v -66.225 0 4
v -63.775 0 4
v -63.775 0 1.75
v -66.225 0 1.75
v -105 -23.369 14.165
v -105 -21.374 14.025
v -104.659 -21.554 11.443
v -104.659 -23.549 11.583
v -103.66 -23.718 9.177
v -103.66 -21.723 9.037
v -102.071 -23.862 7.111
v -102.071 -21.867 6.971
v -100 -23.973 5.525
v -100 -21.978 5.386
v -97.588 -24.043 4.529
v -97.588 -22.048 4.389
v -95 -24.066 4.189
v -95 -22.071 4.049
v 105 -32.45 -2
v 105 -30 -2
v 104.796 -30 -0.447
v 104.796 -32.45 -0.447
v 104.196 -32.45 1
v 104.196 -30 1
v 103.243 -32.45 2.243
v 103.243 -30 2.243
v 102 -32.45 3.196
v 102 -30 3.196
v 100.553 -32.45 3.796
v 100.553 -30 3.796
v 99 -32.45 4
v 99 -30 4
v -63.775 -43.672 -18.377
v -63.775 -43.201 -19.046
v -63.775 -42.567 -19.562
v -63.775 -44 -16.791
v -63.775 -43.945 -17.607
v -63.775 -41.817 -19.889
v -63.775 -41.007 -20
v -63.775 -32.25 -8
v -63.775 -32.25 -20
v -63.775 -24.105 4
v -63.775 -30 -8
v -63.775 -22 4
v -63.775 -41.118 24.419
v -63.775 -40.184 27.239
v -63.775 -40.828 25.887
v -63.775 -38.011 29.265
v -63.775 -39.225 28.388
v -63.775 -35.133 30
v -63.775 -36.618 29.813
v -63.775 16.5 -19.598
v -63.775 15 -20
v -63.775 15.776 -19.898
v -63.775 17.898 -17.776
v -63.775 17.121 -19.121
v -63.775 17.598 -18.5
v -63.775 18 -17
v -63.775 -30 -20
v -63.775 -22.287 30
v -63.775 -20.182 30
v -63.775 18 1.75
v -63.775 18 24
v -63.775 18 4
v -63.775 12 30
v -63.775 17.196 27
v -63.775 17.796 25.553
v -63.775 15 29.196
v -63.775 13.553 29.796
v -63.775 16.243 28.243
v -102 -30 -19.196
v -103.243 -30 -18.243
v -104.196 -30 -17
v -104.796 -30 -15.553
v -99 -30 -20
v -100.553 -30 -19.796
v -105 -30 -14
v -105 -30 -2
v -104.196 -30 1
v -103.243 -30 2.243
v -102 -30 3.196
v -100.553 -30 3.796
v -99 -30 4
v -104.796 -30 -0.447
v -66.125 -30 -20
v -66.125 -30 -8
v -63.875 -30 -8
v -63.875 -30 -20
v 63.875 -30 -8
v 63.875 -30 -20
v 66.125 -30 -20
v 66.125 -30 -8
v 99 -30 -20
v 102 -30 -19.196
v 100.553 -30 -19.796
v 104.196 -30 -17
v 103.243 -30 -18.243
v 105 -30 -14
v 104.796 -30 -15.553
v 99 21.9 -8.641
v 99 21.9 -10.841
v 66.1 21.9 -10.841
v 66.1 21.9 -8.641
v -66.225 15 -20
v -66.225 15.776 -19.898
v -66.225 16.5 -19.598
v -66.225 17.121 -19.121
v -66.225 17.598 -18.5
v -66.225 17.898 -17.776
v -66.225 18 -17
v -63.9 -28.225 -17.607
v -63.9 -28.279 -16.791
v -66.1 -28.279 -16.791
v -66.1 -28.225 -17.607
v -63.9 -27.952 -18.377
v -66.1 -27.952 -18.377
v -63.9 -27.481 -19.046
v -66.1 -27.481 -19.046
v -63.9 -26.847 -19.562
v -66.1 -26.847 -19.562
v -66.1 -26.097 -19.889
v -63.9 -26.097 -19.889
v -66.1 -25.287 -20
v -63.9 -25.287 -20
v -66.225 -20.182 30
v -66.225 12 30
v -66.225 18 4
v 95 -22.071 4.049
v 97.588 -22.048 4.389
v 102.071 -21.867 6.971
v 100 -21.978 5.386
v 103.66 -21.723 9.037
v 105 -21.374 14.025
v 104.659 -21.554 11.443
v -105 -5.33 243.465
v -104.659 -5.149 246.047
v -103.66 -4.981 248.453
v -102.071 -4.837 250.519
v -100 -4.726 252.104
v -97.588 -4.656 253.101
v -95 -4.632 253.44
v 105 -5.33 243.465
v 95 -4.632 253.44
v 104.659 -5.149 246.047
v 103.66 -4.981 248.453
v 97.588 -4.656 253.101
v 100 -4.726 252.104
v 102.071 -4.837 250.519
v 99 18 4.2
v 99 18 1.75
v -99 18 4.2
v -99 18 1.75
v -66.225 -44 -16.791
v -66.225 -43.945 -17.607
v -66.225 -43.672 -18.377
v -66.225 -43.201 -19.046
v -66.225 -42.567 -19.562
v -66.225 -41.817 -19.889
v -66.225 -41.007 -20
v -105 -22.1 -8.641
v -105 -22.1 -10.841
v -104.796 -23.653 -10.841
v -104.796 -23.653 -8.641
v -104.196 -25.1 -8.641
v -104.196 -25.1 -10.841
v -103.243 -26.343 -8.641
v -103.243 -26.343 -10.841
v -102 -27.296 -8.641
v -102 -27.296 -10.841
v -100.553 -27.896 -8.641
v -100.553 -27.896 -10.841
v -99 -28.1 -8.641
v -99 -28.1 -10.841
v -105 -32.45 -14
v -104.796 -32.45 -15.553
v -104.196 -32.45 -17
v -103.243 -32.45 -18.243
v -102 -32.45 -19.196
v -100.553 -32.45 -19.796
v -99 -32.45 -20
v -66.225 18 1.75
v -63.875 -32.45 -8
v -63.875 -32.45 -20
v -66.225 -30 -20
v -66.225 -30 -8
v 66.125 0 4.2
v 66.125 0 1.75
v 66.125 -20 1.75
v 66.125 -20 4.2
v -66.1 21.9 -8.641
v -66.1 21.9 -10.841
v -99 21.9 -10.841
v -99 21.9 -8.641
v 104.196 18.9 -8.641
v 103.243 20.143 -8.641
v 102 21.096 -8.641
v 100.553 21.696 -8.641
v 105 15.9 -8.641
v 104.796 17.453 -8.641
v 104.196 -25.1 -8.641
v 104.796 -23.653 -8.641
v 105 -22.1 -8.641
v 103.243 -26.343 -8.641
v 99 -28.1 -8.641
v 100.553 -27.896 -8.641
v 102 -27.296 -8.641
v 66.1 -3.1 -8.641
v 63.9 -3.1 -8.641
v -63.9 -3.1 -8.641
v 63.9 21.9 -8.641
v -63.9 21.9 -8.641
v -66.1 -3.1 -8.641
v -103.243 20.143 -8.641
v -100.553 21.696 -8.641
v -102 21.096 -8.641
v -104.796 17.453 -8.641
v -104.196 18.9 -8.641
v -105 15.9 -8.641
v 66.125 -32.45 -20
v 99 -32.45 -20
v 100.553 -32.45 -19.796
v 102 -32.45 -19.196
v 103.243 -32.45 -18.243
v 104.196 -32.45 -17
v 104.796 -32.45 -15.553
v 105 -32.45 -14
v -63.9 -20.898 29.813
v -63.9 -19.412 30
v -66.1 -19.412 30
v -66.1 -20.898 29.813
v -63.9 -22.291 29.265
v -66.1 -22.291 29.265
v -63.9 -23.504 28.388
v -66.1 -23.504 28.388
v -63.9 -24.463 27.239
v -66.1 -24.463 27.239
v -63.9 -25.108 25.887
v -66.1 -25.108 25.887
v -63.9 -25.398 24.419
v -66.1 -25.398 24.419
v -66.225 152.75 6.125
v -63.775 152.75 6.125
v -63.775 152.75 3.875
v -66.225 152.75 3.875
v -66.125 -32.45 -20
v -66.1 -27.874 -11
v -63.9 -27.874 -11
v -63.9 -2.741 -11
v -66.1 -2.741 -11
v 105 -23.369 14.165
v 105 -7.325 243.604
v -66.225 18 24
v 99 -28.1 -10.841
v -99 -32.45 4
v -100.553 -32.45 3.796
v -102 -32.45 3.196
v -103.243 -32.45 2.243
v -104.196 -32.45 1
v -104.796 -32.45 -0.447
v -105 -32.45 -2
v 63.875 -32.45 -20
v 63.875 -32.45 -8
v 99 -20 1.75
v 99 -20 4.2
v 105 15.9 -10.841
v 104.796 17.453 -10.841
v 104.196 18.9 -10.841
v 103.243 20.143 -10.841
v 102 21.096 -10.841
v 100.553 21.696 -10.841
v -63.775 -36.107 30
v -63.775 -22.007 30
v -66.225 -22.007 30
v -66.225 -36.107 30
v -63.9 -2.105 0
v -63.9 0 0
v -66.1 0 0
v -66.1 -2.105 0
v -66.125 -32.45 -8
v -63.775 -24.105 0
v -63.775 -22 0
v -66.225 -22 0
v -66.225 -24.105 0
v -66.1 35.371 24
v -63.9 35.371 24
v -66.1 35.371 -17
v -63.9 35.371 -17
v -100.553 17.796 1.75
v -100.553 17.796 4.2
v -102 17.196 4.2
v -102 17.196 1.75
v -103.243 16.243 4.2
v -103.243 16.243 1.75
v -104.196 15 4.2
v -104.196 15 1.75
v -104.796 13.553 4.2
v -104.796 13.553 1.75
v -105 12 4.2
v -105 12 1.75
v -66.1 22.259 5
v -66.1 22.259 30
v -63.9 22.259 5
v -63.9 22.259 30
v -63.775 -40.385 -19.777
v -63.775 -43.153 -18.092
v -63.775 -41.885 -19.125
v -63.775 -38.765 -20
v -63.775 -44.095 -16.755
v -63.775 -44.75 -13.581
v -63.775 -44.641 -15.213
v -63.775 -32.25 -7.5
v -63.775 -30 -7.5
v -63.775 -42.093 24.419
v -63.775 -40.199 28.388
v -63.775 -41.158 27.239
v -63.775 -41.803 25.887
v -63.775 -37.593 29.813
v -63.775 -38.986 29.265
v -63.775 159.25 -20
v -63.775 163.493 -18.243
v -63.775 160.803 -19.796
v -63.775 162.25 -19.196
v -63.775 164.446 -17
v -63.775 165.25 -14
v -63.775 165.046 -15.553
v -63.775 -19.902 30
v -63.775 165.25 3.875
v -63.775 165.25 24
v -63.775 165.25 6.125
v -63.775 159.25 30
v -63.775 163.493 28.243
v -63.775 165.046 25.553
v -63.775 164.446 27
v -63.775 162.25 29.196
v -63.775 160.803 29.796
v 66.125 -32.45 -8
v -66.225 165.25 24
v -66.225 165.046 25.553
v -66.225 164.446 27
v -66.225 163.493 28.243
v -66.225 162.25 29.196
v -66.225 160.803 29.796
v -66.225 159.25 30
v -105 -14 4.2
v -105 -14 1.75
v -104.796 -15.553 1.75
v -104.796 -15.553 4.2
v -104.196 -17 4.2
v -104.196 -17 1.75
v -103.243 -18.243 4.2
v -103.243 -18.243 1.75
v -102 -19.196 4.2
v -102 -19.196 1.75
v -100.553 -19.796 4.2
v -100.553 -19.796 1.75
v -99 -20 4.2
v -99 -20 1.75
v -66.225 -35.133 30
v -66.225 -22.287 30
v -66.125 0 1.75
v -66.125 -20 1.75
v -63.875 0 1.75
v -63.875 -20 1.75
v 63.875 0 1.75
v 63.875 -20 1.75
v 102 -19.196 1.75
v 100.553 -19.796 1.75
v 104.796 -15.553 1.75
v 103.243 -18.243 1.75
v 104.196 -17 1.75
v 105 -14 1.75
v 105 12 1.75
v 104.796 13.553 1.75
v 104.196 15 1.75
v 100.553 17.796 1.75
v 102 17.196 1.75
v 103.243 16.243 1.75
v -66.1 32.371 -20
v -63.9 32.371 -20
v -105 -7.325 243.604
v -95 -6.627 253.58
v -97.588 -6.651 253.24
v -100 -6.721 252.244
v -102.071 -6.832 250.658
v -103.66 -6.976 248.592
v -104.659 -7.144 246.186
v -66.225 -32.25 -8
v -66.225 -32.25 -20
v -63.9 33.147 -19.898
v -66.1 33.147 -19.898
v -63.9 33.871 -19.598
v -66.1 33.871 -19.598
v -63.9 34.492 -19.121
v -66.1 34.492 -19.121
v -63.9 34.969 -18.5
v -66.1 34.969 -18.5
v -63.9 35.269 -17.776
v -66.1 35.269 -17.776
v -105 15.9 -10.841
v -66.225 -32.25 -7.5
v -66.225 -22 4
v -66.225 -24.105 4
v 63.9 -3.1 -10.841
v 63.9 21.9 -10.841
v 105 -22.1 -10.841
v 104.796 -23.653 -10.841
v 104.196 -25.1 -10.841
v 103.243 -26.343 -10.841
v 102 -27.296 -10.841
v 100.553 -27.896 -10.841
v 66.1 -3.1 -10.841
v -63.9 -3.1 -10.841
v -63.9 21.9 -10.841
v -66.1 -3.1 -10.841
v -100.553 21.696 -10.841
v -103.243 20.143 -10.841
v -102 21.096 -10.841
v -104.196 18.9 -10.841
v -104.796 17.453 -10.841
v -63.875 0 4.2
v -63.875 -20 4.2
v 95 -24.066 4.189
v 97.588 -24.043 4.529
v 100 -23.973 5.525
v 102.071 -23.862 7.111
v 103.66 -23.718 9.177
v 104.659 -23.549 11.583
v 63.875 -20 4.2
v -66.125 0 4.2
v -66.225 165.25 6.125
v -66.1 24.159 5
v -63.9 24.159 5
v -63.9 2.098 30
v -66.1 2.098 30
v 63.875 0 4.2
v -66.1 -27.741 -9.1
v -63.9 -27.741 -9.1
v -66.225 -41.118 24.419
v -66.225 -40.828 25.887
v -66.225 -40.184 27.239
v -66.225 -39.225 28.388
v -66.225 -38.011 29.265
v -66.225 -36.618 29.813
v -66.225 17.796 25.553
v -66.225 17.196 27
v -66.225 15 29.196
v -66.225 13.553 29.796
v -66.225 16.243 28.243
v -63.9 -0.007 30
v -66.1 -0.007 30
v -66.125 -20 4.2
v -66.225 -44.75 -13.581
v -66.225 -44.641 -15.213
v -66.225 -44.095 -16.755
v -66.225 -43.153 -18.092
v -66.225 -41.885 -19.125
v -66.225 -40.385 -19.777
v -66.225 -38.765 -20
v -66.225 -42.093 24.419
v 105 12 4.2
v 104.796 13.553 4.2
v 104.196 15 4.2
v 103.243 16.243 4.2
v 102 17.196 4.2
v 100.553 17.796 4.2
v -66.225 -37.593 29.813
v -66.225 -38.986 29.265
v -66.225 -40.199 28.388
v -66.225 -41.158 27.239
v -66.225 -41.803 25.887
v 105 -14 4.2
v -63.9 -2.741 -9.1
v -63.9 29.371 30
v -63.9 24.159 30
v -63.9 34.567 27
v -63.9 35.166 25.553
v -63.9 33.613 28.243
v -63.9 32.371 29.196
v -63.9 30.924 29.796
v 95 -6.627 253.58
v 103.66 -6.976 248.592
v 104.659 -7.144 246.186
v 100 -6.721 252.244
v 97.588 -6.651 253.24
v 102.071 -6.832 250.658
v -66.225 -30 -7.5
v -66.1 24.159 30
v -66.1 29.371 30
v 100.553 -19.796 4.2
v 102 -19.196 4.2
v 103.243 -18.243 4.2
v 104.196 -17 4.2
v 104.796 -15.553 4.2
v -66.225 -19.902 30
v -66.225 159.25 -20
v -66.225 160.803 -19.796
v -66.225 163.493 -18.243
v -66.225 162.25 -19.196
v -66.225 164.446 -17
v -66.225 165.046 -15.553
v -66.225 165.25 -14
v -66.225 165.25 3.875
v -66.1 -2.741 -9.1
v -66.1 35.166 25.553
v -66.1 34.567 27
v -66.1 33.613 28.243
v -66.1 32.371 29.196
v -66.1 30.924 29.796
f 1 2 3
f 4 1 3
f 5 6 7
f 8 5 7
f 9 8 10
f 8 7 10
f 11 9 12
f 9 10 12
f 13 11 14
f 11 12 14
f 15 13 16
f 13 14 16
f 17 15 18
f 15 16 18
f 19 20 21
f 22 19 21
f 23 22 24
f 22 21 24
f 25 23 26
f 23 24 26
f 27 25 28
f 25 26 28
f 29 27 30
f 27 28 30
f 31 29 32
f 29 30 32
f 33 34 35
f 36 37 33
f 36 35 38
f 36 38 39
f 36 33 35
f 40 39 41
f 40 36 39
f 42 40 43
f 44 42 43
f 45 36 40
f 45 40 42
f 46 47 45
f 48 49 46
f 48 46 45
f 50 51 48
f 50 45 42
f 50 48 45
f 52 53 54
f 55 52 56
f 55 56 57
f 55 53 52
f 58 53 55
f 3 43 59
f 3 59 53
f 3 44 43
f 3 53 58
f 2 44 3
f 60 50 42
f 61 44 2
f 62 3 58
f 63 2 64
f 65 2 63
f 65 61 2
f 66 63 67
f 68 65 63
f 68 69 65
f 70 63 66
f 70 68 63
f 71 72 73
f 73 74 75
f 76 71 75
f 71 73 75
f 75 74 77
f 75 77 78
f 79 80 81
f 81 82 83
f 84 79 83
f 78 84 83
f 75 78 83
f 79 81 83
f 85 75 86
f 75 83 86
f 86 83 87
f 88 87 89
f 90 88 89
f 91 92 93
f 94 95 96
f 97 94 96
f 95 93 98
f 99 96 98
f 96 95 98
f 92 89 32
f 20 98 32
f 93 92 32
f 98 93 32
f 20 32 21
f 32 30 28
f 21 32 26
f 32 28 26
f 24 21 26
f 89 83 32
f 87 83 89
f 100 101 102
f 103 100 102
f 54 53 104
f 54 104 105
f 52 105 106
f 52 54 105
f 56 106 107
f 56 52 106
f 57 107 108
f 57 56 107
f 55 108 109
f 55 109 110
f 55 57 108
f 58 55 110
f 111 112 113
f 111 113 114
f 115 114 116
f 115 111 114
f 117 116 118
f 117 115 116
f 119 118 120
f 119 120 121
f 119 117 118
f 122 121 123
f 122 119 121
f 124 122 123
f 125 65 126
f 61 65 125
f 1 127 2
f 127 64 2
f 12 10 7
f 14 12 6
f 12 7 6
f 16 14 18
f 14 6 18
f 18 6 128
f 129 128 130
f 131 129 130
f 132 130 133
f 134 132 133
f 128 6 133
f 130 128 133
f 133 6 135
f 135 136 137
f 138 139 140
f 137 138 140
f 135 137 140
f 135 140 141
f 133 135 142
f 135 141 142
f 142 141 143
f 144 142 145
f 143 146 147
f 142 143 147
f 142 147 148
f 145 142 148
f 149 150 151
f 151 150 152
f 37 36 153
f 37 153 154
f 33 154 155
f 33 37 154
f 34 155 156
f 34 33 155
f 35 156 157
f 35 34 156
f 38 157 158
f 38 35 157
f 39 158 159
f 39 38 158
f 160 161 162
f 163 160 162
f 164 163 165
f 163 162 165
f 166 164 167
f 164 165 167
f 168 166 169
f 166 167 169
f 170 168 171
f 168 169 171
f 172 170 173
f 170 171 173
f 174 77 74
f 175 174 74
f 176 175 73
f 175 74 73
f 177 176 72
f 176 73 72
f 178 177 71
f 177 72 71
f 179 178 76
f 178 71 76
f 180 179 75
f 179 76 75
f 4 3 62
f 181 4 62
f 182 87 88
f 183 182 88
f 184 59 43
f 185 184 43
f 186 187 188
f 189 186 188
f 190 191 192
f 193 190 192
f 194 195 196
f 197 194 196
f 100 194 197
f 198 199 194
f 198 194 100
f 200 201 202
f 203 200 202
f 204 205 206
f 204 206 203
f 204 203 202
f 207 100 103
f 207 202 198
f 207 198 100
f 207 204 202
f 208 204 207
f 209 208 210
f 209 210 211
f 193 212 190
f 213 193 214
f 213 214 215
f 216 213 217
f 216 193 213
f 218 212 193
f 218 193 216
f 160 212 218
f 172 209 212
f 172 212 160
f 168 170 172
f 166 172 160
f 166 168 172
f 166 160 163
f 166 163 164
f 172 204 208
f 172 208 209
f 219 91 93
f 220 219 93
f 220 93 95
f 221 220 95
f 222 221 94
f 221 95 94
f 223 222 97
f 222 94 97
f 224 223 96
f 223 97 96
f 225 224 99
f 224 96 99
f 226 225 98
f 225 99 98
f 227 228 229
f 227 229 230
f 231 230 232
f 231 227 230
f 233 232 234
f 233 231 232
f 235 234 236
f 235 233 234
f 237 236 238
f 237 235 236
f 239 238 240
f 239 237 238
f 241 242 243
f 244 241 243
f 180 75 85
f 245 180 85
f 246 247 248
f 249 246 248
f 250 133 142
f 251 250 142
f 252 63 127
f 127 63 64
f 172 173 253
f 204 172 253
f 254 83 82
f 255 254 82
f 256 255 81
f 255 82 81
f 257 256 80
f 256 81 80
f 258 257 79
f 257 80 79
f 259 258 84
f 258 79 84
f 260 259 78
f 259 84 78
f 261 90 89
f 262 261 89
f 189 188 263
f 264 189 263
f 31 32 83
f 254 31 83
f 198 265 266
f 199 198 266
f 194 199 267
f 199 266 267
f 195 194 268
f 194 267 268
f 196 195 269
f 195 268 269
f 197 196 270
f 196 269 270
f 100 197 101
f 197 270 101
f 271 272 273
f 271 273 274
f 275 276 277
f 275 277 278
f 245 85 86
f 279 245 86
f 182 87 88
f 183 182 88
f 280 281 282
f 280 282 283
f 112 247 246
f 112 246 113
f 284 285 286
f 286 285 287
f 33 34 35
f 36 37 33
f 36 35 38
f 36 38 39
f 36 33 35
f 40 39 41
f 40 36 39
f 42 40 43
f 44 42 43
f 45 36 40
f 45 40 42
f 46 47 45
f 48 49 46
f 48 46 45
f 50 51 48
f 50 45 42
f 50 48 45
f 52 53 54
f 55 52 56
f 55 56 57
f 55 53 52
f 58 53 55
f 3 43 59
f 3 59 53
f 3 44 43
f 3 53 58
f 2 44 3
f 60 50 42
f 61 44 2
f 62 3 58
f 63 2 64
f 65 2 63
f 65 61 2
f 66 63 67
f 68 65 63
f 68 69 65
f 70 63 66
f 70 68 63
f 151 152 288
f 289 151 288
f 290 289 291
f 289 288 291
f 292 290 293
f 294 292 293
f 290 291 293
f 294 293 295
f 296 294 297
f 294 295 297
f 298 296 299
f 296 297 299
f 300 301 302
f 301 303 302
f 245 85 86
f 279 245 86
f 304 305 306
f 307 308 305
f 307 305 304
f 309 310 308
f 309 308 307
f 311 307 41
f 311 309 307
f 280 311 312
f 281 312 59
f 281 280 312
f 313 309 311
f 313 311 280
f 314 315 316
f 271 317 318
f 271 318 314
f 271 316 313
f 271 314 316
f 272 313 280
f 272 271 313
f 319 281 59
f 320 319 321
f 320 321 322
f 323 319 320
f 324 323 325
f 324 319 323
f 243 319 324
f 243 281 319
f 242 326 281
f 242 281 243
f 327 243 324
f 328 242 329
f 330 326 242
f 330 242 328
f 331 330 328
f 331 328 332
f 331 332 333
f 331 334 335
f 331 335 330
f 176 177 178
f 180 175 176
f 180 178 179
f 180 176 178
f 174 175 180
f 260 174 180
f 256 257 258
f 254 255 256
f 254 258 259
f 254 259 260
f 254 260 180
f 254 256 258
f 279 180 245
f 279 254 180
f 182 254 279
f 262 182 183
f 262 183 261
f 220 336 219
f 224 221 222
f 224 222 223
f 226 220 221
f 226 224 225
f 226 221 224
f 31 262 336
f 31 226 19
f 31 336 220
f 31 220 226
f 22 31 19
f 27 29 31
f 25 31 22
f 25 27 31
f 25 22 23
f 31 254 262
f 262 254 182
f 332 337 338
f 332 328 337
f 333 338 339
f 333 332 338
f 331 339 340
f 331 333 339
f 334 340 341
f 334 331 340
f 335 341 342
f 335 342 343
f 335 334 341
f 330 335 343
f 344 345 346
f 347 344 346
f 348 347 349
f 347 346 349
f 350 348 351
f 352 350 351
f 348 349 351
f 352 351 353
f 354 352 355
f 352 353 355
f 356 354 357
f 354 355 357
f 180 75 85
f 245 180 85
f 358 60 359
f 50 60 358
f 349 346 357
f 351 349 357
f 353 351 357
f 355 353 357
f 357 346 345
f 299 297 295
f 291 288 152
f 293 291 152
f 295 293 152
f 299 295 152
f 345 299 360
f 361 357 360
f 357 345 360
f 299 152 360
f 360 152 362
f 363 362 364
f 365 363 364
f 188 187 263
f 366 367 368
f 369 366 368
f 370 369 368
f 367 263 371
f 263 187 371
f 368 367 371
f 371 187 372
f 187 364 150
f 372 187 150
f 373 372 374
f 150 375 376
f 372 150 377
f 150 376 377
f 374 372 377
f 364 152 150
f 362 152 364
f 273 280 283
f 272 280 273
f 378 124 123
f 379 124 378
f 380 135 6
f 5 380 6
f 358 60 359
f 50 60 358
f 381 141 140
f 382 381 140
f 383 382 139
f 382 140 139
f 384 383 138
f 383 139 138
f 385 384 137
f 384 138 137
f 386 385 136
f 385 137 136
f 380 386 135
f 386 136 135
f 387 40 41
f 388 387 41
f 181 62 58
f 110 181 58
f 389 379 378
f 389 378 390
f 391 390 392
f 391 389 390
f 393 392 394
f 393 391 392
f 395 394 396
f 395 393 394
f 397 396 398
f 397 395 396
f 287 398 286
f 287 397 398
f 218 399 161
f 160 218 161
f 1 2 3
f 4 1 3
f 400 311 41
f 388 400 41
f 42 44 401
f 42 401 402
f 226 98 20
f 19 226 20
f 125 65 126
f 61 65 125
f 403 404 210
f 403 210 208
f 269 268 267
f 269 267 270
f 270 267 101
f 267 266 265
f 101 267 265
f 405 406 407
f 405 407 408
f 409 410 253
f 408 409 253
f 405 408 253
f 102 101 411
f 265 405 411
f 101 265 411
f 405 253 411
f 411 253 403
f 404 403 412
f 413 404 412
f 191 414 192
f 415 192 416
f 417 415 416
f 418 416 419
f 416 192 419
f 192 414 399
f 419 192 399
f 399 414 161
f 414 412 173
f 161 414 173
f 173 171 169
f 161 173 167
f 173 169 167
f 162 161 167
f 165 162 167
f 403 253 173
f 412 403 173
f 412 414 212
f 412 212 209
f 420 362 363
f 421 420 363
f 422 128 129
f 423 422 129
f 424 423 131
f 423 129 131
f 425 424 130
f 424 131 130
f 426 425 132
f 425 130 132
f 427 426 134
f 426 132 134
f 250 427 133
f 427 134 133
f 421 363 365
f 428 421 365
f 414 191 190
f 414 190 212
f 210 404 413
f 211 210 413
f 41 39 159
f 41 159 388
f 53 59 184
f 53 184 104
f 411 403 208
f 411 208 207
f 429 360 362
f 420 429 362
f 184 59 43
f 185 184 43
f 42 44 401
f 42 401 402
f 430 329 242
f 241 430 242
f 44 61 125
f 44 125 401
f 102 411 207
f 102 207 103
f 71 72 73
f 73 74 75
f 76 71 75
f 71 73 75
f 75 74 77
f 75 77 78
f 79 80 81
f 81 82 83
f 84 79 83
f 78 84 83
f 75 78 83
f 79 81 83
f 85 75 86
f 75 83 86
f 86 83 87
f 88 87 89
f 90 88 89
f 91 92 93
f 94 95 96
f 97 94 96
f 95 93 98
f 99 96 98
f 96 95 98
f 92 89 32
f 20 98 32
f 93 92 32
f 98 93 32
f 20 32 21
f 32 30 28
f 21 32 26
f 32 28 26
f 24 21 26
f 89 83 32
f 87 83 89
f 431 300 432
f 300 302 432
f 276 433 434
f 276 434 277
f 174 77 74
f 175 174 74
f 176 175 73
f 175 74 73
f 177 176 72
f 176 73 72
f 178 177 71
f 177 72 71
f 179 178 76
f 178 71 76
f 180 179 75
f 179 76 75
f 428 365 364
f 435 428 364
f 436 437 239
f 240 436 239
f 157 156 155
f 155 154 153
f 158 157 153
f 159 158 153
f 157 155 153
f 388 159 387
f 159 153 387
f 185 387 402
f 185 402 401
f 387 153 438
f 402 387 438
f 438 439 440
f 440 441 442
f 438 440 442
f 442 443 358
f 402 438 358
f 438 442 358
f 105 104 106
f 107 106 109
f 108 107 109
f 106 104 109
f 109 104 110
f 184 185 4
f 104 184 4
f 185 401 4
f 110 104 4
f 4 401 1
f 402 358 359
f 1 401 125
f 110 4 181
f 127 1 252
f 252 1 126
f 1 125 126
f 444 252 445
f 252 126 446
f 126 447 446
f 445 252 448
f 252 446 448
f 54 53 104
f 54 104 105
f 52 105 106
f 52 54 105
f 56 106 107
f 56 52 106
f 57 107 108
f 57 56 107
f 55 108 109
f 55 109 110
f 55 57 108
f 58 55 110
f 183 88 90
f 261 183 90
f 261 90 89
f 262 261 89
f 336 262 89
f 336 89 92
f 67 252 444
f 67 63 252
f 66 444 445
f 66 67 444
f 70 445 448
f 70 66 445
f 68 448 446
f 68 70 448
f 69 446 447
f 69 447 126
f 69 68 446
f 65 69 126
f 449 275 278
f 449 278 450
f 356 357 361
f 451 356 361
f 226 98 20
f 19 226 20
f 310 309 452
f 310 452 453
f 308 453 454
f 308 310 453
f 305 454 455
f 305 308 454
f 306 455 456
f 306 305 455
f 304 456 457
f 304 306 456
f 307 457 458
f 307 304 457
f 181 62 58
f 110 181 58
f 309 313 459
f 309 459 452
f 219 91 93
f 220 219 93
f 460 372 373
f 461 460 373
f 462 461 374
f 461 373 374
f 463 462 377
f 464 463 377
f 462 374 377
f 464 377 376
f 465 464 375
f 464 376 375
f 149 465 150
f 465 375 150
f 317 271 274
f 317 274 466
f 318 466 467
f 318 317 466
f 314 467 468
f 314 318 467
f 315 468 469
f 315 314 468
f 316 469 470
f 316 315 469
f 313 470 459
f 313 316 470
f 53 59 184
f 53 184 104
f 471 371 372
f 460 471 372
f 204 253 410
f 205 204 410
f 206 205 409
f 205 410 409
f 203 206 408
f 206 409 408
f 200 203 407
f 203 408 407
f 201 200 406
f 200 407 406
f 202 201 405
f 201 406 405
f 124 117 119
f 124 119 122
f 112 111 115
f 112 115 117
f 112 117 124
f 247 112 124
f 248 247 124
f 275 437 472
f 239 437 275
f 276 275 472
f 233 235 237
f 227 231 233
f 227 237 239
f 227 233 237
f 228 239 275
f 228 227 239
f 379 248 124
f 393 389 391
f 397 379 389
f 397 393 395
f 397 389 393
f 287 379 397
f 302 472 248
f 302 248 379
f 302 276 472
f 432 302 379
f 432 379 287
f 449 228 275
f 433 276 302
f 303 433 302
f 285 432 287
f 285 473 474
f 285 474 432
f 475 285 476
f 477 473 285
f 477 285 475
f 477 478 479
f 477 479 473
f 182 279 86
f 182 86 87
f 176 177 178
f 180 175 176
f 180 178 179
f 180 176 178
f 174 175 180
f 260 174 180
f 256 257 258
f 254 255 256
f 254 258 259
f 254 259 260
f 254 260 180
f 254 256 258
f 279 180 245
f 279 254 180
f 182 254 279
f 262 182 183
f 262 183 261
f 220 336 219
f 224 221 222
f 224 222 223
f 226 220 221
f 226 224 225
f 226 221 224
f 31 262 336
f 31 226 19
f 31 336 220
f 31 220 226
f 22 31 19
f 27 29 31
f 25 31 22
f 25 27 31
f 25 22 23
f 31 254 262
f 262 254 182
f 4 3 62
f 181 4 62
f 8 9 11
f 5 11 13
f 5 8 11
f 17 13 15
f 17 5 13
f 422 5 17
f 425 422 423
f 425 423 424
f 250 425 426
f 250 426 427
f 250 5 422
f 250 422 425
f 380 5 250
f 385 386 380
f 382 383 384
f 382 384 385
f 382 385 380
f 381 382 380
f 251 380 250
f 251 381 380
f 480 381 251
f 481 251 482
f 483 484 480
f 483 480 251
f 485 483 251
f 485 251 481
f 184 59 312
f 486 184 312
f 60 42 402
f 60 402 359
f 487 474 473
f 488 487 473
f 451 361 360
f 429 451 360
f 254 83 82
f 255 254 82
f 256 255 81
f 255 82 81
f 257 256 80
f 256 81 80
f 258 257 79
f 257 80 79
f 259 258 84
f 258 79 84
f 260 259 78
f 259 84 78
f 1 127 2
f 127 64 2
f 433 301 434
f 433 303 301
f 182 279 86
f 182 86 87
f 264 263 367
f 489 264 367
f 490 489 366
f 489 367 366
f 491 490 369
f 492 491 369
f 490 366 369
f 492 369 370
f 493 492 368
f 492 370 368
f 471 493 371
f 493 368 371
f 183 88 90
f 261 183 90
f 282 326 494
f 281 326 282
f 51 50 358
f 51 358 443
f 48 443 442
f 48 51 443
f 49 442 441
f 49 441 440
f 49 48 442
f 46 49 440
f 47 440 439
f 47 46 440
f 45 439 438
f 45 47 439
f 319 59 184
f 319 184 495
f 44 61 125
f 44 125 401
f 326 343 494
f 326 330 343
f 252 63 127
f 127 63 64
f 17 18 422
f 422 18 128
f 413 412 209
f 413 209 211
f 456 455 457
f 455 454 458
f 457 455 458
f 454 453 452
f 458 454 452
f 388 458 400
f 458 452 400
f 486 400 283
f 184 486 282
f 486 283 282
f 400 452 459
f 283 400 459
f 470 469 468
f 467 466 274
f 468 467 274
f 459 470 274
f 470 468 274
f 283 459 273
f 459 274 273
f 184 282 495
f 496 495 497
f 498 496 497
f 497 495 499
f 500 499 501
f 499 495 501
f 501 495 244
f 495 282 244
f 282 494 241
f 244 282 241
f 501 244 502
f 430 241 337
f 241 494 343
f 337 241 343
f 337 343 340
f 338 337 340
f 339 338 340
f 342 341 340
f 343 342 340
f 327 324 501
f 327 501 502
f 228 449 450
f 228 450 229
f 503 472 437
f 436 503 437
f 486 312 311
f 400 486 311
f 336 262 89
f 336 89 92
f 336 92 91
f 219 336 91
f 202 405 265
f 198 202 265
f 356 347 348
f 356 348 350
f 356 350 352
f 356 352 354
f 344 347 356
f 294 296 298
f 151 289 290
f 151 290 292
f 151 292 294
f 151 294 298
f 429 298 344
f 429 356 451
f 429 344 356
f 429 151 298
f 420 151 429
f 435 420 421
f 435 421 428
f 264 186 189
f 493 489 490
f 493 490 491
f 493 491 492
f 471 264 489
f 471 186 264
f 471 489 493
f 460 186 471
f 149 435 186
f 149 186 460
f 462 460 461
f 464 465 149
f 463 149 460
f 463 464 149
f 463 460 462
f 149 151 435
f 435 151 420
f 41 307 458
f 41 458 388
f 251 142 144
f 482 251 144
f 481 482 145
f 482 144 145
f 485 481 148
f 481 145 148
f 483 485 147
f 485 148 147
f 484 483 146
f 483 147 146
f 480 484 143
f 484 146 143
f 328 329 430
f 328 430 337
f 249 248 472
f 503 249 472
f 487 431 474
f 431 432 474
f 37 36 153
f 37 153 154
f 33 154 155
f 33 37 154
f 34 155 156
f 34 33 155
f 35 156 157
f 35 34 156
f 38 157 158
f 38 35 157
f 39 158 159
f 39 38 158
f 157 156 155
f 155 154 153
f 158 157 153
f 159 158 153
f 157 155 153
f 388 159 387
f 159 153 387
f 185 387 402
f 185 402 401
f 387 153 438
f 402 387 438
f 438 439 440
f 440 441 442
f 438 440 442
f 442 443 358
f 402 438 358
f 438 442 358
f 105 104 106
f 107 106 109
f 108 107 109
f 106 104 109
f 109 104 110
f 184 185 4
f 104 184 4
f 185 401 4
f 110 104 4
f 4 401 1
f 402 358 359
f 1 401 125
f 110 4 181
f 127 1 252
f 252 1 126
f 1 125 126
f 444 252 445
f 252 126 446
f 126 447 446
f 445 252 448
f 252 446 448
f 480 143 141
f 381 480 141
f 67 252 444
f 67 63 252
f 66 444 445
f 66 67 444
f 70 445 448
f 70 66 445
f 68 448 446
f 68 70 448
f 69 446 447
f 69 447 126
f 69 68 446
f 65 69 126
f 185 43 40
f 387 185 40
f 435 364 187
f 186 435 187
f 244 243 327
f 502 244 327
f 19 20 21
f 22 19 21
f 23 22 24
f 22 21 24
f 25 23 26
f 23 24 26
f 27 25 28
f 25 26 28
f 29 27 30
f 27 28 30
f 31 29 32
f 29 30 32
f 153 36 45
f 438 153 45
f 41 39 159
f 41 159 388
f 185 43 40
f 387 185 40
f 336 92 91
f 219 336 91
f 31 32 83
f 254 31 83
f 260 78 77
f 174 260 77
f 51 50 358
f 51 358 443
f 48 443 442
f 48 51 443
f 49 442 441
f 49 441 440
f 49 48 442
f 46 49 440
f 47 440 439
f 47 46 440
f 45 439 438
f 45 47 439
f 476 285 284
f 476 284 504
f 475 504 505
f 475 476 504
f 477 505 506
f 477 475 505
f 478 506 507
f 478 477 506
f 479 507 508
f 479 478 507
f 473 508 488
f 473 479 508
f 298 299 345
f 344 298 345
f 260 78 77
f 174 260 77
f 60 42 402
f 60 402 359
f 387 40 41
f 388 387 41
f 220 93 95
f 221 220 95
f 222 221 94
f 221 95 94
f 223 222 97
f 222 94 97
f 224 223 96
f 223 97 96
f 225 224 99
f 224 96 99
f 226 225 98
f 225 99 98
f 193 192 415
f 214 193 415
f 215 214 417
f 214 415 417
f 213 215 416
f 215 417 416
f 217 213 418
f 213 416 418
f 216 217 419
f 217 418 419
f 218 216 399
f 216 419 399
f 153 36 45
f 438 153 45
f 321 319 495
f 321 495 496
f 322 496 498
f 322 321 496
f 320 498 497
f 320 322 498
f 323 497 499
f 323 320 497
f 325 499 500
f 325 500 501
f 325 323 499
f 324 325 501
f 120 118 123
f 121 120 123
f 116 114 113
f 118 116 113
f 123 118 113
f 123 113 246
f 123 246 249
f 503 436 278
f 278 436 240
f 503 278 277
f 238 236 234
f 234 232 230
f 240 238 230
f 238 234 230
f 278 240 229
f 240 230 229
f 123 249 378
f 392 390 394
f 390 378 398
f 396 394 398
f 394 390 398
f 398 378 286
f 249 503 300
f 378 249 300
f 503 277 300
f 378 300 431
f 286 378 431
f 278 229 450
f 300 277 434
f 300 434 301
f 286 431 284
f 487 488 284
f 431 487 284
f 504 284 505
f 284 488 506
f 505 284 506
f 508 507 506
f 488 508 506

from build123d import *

# Parameters (mm, degrees)
PAD_DEPTH               = 2
PAD001_DEPTH            = 1.1
PAD002_DEPTH            = 2.2
BODY004_PLACEMENT_ANGLE = 90
PAD004_DEPTH            = 1.225
PAD005_DEPTH            = 2.45
PAD006_DEPTH            = 2.45
PAD007_DEPTH            = 1.225
PAD008_DEPTH            = 1.225
PAD009_DEPTH            = 2.45


with BuildPart() as body:
    # Sketch (on DatumPlane) → Pad (new body)
    with BuildSketch(Plane(origin=(0, -22.071287, 4.049479), x_dir=(1, 0, 0), z_dir=(0, -0.997564, 0.069756))):
        with BuildLine():
            Line((-95, 0), (95, 0))
            ThreePointArc((95, 0), (102.071068, 2.928932), (105, 10))
            Line((105, 10), (105, 240))
            ThreePointArc((105, 240), (102.071068, 247.071068), (95, 250))
            Line((95, 250), (-95, 250))
            ThreePointArc((-95, 250), (-102.071068, 247.071068), (-105, 240))
            Line((-105, 240), (-105, 10))
            ThreePointArc((-105, 10), (-102.071068, 2.928932), (-95, 0))
        make_face()
    extrude(amount=PAD_DEPTH)


with BuildPart() as body002:
    # Sketch002 → Pad001 (new body, symmetric)
    with BuildSketch(Plane.YZ.offset(65)):
        with BuildLine():
            Line((22.258538, 30), (2.097804, 30))
            Line((2.097804, 30), (0, 0))
            Line((0, 0), (-2.105128, 0))
            Line((-2.105128, 0), (-0.007324, 30))
            Line((-0.007324, 30), (-19.412233, 30))
            ThreePointArc((-19.412233, 30), (-23.504223, 28.388122), (-25.397617, 24.418539))
            Line((-27.741462, -9.1), (-25.397617, 24.418539))
            Line((-2.741462, -9.1), (-27.741462, -9.1))
            Line((-2.741462, -11), (-2.741462, -9.1))
            Line((-27.874323, -11), (-2.741462, -11))
            Line((-27.874323, -11), (-28.27925, -16.790731))
            ThreePointArc((-28.27925, -16.790731), (-27.480619, -19.045995), (-25.286558, -20))
            Line((-25.286558, -20), (32.37075, -20))
            ThreePointArc((32.37075, -20), (34.49207, -19.12132), (35.37075, -17))
            Line((35.37075, 24), (35.37075, -17))
            ThreePointArc((35.37075, 24), (33.61339, 28.242641), (29.37075, 30))
            Line((24.158538, 30), (29.37075, 30))
            Line((24.158538, 5), (24.158538, 30))
            Line((22.258538, 5), (24.158538, 5))
            Line((22.258538, 30), (22.258538, 5))
        make_face()
    extrude(amount=PAD001_DEPTH, both=True)


with BuildPart() as body002_1:
    # Body002 placement: moved
    add(body002.part.moved(Location((-130, 0, 0))))


with BuildPart() as body004:
    # Sketch004 (on Face20 of Binder002) → Pad002 (new body)
    with BuildSketch(Plane(origin=(0, 22.258538, 0), x_dir=(-1, 0, 0), z_dir=(0, 1, 0))):
        with BuildLine():
            Line((-99, -20), (-66.1, -20))
            Line((-66.1, 5), (-66.1, -20))
            Line((-63.9, 5), (-66.1, 5))
            Line((-63.9, -20), (-63.9, 5))
            Line((-63.9, -20), (63.9, -20))
            Line((63.9, 5), (63.9, -20))
            Line((66.1, 5), (63.9, 5))
            Line((66.1, -20), (66.1, 5))
            Line((66.1, -20), (99, -20))
            ThreePointArc((99, -20), (103.242641, -18.242641), (105, -14))
            Line((105, -14), (105, 24))
            ThreePointArc((105, 24), (103.242641, 28.242641), (99, 30))
            Line((99, 30), (-99, 30))
            ThreePointArc((-99, 30), (-103.242641, 28.242641), (-105, 24))
            Line((-105, 24), (-105, -14))
            ThreePointArc((-105, -14), (-103.242641, -18.242641), (-99, -20))
        make_face()
    extrude(amount=PAD002_DEPTH)


with BuildPart() as body004_1:
    # Body004 placement: moved
    add(body004.part.moved(Location((0, 1.9, -33.1))).rotate(Axis((0, 1.9, -33.1), (1, 0, 0)), BODY004_PLACEMENT_ANGLE))


with BuildPart() as body007:
    # Sketch007 → Pad004 (new body, symmetric)
    with BuildSketch(Plane.YZ.offset(65)):
        with BuildLine():
            Line((12, 30), (-20.181903, 30))
            Line((-20.181903, 30), (-22, 4))
            Line((-22, 4), (-24.105128, 4))
            Line((-24.105128, 4), (-22.287031, 30))
            Line((-22.287031, 30), (-35.132983, 30))
            ThreePointArc((-35.132983, 30), (-39.224973, 28.388122), (-41.118367, 24.418539))
            Line((-44, -16.790731), (-41.118367, 24.418539))
            ThreePointArc((-44, -16.790731), (-43.201369, -19.045995), (-41.007308, -20))
            Line((-41.007308, -20), (-32.25, -20))
            Line((-32.25, -8), (-32.25, -20))
            Line((-30, -8), (-32.25, -8))
            Line((-30, -20), (-30, -8))
            Line((-30, -20), (15, -20))
            ThreePointArc((15, -20), (17.12132, -19.12132), (18, -17))
            Line((18, 1.75), (18, -17))
            Line((0, 1.75), (18, 1.75))
            Line((0, 4), (0, 1.75))
            Line((18, 4), (0, 4))
            Line((18, 24), (18, 4))
            ThreePointArc((18, 24), (16.242641, 28.242641), (12, 30))
        make_face()
    extrude(amount=PAD004_DEPTH, both=True)


with BuildPart() as body007_1:
    # Body007 placement: moved
    add(body007.part.moved(Location((-130, 0, 0))))


with BuildPart() as body008:
    # Sketch008 (on Face13 of Binder003) → Pad005 (new body)
    with BuildSketch(Plane.XZ.offset(30)):
        with BuildLine():
            Line((-66.125, -20), (-66.125, -8))
            Line((-66.125, -8), (-63.875, -8))
            Line((-63.875, -8), (-63.875, -20))
            Line((-63.875, -20), (63.875, -20))
            Line((63.875, -20), (63.875, -8))
            Line((63.875, -8), (66.125, -8))
            Line((66.125, -8), (66.125, -20))
            Line((66.125, -20), (99, -20))
            ThreePointArc((99, -20), (103.242641, -18.242641), (105, -14))
            Line((105, -14), (105, -2))
            ThreePointArc((105, -2), (103.242641, 2.242641), (99, 4))
            Line((99, 4), (-99, 4))
            ThreePointArc((-99, 4), (-103.242641, 2.242641), (-105, -2))
            Line((-105, -2), (-105, -14))
            ThreePointArc((-105, -14), (-103.242641, -18.242641), (-99, -20))
            Line((-99, -20), (-66.125, -20))
        make_face()
    extrude(amount=PAD005_DEPTH)


with BuildPart() as body009:
    # Sketch009 (on Face17 of Binder006) → Pad006 (new body)
    with BuildSketch(Plane.XY.offset(1.75)):
        with BuildLine():
            Line((-66.125, -20), (-66.125, 0))
            Line((-66.125, 0), (-63.875, 0))
            Line((-63.875, 0), (-63.875, -20))
            Line((-63.875, -20), (63.875, -20))
            Line((63.875, -20), (63.875, 0))
            Line((63.875, 0), (66.125, 0))
            Line((66.125, 0), (66.125, -20))
            Line((66.125, -20), (99, -20))
            ThreePointArc((99, -20), (103.242641, -18.242641), (105, -14))
            Line((105, -14), (105, 12))
            ThreePointArc((105, 12), (103.242641, 16.242641), (99, 18))
            Line((99, 18), (-99, 18))
            ThreePointArc((-99, 18), (-103.242641, 16.242641), (-105, 12))
            Line((-105, 12), (-105, -14))
            ThreePointArc((-105, -14), (-103.242641, -18.242641), (-99, -20))
            Line((-99, -20), (-66.125, -20))
        make_face()
    extrude(amount=PAD006_DEPTH)


with BuildPart() as body011:
    # Sketch010 → Pad007 (new body, symmetric)
    with BuildSketch(Plane.YZ.offset(65)):
        with BuildLine():
            Line((-19.902196, 30), (-22, 0))
            Line((-22, 0), (-24.105128, 0))
            Line((-24.105128, 0), (-22.007324, 30))
            Line((-22.007324, 30), (-36.107397, 30))
            ThreePointArc((-36.107397, 30), (-40.199387, 28.388122), (-42.092781, 24.418539))
            Line((-42.092781, 24.418539), (-44.75, -13.581461))
            ThreePointArc((-44.75, -13.581461), (-43.152738, -18.09199), (-38.764616, -20))
            Line((-38.764616, -20), (-32.25, -20))
            Line((-32.25, -7.5), (-32.25, -20))
            Line((-30, -7.5), (-32.25, -7.5))
            Line((-30, -20), (-30, -7.5))
            Line((-30, -20), (159.25, -20))
            ThreePointArc((159.25, -20), (163.492641, -18.242641), (165.25, -14))
            Line((165.25, -14), (165.25, 3.875))
            Line((152.75, 3.875), (165.25, 3.875))
            Line((152.75, 6.125), (152.75, 3.875))
            Line((165.25, 6.125), (152.75, 6.125))
            Line((165.25, 6.125), (165.25, 24))
            ThreePointArc((165.25, 24), (163.492641, 28.242641), (159.25, 30))
            Line((159.25, 30), (-19.902196, 30))
        make_face()
    extrude(amount=PAD007_DEPTH, both=True)


with BuildPart() as body011_1:
    # Body011 placement: moved
    add(body011.part.moved(Location((-130, 0, 0))))


with BuildPart() as body013:
    # Sketch011 → Pad008 (new body, symmetric)
    with BuildSketch(Plane.YZ.offset(65)):
        with BuildLine():
            Line((12, 30), (-20.181903, 30))
            Line((-20.181903, 30), (-22, 4))
            Line((-22, 4), (-24.105128, 4))
            Line((-24.105128, 4), (-22.287031, 30))
            Line((-22.287031, 30), (-35.132983, 30))
            ThreePointArc((-35.132983, 30), (-39.224973, 28.388122), (-41.118367, 24.418539))
            Line((-44, -16.790731), (-41.118367, 24.418539))
            ThreePointArc((-44, -16.790731), (-43.201369, -19.045995), (-41.007308, -20))
            Line((-41.007308, -20), (-32.25, -20))
            Line((-32.25, -8), (-32.25, -20))
            Line((-30, -8), (-32.25, -8))
            Line((-30, -20), (-30, -8))
            Line((-30, -20), (15, -20))
            ThreePointArc((15, -20), (17.12132, -19.12132), (18, -17))
            Line((18, 1.75), (18, -17))
            Line((0, 1.75), (18, 1.75))
            Line((0, 4), (0, 1.75))
            Line((18, 4), (0, 4))
            Line((18, 24), (18, 4))
            ThreePointArc((18, 24), (16.242641, 28.242641), (12, 30))
        make_face()
    extrude(amount=PAD008_DEPTH, both=True)


with BuildPart() as body013_1:
    # Body013 placement: moved
    add(body013.part.moved(Location((-130, 0, 0))))


with BuildPart() as body014:
    # Sketch012 → Pad009 (new body)
    with BuildSketch(Plane.XZ.offset(30)):
        with BuildLine():
            Line((-66.125, -20), (-66.125, -8))
            Line((-66.125, -8), (-63.875, -8))
            Line((-63.875, -8), (-63.875, -20))
            Line((-63.875, -20), (63.875, -20))
            Line((63.875, -20), (63.875, -8))
            Line((63.875, -8), (66.125, -8))
            Line((66.125, -8), (66.125, -20))
            Line((66.125, -20), (99, -20))
            ThreePointArc((99, -20), (103.242641, -18.242641), (105, -14))
            Line((105, -14), (105, -2))
            ThreePointArc((105, -2), (103.242641, 2.242641), (99, 4))
            Line((99, 4), (-99, 4))
            ThreePointArc((-99, 4), (-103.242641, 2.242641), (-105, -2))
            Line((-105, -2), (-105, -14))
            ThreePointArc((-105, -14), (-103.242641, -18.242641), (-99, -20))
            Line((-99, -20), (-66.125, -20))
        make_face()
    extrude(amount=PAD009_DEPTH)


solid = Compound([body.part, body002_1.part, body004_1.part, body007_1.part, body008.part, body009.part, body011_1.part, body013_1.part, body014.part])
